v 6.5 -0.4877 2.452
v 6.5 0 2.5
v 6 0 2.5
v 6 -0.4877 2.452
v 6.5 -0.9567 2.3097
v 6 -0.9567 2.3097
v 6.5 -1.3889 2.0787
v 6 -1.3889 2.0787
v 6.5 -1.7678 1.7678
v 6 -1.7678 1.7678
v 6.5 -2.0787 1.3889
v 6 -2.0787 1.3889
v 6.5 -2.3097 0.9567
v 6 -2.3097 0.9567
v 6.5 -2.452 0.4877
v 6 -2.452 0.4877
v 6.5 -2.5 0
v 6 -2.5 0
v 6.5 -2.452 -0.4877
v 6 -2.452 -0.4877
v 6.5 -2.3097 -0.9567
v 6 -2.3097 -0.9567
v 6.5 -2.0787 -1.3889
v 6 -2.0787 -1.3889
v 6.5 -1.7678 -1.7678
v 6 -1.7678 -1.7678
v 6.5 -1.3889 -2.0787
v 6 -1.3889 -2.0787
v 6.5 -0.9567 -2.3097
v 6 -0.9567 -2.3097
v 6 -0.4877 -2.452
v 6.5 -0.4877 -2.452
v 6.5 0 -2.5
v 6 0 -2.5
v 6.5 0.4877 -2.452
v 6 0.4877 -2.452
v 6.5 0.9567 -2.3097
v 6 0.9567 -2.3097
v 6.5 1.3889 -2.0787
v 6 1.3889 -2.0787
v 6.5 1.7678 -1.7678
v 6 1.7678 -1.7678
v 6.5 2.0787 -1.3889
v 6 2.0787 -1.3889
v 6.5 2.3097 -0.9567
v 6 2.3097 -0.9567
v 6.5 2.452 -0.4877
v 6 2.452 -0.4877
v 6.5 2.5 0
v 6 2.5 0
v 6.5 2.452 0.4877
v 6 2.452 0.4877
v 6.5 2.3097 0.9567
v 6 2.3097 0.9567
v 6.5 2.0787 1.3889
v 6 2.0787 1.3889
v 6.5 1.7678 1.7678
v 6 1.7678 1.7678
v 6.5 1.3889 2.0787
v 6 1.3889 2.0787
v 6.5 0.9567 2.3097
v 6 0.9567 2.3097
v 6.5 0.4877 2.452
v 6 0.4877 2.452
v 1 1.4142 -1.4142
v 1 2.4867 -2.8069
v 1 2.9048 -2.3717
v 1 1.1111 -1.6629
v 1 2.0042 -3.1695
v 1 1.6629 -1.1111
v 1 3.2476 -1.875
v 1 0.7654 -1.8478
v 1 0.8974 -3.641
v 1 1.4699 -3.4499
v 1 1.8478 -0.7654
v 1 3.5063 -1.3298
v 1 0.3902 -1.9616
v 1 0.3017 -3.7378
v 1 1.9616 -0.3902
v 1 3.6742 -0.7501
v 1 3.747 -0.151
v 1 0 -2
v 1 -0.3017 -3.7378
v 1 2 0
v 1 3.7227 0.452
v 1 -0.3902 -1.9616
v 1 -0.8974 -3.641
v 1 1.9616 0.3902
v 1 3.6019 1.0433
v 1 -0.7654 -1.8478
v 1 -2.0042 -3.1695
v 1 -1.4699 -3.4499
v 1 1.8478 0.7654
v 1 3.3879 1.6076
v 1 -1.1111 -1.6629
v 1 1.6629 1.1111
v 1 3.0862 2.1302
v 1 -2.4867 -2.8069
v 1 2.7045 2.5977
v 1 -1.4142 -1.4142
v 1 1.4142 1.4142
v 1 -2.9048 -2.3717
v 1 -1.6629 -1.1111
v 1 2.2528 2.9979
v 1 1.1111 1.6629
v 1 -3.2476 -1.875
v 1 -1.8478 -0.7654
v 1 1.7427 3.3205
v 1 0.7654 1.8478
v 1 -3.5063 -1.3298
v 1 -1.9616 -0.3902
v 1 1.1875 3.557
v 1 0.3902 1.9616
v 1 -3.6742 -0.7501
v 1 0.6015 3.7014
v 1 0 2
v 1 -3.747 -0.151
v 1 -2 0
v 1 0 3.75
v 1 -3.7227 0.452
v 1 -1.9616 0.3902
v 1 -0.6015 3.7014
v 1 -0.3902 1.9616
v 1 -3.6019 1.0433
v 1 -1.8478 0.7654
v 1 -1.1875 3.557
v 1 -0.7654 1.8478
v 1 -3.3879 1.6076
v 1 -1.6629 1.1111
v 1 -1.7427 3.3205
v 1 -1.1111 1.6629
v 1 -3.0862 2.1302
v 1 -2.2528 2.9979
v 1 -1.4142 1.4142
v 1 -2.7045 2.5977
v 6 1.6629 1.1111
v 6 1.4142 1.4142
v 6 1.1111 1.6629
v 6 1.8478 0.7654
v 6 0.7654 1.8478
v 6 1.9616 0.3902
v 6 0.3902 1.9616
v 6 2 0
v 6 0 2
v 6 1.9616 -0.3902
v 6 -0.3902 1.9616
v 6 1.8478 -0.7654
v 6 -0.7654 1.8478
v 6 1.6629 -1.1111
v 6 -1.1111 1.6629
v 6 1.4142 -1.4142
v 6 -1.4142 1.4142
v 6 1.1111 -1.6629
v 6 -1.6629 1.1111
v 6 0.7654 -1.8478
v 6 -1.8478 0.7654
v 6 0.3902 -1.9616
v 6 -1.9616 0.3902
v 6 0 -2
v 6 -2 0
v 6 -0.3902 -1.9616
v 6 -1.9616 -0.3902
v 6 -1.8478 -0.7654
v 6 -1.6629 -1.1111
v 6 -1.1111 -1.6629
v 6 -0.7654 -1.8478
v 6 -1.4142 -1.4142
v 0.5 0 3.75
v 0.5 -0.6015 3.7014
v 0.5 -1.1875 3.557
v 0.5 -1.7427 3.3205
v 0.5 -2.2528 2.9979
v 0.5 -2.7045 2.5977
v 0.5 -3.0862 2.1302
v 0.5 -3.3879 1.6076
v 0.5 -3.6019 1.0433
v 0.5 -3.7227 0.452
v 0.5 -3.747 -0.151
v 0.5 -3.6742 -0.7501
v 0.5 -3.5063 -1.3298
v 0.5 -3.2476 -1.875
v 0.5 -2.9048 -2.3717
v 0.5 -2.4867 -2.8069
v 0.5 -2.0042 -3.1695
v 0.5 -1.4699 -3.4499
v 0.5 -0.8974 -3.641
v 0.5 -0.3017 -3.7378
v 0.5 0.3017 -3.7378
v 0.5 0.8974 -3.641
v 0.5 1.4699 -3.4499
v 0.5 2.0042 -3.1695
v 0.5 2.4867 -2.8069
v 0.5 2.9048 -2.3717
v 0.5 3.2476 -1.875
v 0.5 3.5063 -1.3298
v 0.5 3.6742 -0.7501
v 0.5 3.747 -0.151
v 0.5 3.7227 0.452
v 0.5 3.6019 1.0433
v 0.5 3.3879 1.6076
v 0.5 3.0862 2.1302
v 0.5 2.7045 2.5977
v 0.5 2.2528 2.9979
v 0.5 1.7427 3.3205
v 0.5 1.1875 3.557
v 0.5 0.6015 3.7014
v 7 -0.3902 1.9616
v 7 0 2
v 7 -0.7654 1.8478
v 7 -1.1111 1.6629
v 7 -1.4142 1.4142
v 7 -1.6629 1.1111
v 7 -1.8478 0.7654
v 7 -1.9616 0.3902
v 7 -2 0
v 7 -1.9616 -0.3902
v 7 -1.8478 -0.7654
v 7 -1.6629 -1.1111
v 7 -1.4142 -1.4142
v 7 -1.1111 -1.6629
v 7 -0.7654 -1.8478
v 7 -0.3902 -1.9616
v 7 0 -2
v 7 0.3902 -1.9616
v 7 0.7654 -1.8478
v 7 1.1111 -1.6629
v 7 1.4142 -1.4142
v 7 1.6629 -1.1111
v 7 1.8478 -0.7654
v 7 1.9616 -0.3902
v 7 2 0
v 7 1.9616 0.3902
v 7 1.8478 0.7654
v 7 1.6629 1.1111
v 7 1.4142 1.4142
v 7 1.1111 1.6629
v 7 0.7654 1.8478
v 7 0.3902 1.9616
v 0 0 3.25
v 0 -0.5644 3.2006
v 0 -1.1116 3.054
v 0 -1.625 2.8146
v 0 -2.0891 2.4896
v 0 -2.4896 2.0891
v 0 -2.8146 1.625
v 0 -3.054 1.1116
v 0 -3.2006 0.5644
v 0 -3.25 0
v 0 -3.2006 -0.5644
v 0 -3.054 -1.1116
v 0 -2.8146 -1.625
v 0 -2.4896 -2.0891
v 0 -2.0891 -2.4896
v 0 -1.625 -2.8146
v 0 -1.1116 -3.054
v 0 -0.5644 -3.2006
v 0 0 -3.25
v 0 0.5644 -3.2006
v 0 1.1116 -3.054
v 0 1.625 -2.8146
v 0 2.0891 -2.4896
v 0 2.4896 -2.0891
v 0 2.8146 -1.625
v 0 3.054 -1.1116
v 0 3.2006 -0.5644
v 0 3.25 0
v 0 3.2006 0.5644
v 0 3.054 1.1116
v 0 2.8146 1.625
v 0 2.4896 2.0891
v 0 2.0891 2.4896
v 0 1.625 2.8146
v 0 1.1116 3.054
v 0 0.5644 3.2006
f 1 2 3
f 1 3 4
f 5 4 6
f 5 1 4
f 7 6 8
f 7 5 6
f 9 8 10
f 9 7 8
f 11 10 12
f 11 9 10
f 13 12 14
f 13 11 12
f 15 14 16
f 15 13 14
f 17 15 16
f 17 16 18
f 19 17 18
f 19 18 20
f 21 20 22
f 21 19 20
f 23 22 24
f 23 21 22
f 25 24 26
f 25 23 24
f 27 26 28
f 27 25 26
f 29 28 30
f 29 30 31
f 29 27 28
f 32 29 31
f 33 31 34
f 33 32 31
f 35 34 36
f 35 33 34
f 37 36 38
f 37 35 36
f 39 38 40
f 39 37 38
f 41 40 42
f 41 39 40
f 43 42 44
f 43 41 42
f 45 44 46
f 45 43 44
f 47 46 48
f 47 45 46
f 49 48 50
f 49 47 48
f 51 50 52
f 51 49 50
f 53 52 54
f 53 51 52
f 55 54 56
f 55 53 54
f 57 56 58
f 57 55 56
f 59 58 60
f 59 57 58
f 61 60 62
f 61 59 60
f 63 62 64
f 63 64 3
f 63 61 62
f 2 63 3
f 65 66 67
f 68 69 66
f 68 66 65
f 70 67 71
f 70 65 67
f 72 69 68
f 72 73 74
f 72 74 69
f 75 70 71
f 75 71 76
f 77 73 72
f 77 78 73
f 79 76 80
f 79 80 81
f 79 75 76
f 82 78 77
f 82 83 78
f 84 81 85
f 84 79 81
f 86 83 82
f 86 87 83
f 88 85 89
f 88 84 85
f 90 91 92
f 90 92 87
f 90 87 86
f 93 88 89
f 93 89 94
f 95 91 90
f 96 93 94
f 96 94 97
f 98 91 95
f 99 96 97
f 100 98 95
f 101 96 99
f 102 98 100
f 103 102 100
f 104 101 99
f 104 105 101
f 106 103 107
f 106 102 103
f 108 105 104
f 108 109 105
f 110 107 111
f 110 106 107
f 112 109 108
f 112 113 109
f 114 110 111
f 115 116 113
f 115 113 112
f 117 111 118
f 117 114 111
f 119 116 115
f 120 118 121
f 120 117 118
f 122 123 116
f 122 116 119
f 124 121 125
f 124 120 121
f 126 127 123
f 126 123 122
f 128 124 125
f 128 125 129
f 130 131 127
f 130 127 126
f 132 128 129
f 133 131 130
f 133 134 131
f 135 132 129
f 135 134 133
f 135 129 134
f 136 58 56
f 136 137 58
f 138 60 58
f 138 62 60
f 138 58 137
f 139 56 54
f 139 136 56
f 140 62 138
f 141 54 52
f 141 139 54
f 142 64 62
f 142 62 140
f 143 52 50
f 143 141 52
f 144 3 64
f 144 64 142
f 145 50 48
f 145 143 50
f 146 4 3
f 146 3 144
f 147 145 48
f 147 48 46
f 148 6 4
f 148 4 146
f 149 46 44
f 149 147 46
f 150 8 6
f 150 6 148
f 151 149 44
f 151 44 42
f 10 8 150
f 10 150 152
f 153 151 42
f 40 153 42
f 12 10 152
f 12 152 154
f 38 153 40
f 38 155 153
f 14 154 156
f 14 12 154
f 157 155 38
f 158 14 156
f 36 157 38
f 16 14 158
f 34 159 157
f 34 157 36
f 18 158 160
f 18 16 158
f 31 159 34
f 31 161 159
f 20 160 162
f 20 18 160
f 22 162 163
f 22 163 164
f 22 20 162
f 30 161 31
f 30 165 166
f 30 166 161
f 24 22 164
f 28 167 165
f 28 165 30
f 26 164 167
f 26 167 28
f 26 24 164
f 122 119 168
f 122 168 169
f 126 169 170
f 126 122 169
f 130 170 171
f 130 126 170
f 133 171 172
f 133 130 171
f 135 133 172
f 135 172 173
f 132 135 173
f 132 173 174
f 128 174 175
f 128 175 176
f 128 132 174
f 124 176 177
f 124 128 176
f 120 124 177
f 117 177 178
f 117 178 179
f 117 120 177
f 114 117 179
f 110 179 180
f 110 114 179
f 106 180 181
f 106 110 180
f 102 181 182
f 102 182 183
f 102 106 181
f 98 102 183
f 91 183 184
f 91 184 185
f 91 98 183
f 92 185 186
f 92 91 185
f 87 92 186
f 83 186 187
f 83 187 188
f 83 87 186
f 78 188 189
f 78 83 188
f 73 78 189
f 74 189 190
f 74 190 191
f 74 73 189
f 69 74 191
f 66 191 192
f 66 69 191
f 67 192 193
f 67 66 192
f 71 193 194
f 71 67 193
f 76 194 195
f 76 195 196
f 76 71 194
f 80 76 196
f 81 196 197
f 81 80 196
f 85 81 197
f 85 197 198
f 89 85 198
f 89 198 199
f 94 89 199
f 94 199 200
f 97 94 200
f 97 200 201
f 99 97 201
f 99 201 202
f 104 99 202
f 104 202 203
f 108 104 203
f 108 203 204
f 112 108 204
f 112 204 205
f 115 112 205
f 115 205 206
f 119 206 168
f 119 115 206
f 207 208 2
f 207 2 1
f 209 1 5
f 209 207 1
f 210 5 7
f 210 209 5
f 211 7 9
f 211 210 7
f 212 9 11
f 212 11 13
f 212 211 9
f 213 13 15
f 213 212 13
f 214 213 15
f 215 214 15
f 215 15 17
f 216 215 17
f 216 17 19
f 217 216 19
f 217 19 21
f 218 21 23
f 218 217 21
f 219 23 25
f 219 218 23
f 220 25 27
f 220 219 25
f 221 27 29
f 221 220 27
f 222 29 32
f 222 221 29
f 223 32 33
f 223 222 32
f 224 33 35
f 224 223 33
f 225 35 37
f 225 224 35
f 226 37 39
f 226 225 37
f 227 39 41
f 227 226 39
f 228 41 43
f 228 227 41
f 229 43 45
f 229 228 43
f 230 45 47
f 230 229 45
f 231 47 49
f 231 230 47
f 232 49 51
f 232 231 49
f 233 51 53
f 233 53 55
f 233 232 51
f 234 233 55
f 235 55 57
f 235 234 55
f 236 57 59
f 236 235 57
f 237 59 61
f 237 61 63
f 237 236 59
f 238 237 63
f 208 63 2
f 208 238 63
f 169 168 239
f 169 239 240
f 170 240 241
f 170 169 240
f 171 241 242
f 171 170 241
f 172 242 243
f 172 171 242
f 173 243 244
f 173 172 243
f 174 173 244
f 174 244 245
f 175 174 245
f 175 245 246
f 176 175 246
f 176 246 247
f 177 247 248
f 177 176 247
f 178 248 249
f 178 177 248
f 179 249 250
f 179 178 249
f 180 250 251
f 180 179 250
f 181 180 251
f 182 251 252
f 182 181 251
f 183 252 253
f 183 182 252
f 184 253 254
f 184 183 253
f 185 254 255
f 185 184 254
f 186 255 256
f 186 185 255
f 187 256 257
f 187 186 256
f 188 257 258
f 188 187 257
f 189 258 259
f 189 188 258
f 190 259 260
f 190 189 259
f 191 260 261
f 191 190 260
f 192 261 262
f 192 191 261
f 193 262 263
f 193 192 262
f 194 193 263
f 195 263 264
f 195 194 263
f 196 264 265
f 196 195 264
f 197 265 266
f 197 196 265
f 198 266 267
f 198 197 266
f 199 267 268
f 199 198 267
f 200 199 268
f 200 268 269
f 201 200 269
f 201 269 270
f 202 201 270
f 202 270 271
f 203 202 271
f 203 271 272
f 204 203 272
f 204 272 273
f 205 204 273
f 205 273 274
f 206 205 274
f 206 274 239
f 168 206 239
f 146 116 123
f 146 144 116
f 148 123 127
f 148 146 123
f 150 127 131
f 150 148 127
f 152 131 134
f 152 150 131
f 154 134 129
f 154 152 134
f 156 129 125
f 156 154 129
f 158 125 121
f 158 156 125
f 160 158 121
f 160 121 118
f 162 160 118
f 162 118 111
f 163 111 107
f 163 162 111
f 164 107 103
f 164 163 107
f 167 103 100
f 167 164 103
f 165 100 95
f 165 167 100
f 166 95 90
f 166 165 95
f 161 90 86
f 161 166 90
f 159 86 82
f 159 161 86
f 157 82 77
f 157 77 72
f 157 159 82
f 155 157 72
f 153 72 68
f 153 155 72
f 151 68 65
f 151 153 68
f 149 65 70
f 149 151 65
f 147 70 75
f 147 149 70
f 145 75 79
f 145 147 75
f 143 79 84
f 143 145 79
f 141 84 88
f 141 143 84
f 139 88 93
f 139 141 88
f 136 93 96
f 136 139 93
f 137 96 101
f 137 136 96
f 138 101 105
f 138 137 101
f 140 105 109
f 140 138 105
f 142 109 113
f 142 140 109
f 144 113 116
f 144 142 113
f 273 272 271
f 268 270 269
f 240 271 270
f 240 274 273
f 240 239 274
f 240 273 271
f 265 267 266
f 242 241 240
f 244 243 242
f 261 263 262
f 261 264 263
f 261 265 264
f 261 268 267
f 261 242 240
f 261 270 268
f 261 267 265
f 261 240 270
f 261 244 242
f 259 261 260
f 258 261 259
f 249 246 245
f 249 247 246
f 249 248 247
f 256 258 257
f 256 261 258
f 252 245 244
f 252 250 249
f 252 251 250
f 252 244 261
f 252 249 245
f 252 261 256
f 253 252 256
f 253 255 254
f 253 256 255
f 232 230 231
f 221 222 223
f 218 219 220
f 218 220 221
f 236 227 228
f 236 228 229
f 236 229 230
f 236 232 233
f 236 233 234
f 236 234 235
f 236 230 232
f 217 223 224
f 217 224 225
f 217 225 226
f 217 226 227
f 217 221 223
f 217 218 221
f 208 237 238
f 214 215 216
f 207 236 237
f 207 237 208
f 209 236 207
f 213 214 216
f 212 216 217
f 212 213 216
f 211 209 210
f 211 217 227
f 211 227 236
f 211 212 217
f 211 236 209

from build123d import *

# Parameters (mm, degrees)
SMUSSO1_SIZE = 0.5


with BuildPart() as part:
    # Schizzo1 → Rivoluzione1 (revolve)
    with BuildSketch(Plane.XY, mode=Mode.PRIVATE) as rivoluzione1_sk:
        Polygon((0, 0), (0, 3.75), (1, 3.75), (1, 2), (6, 2), (6, 2.5), (7, 2.5), (7, 0), align=None)
    revolve(rivoluzione1_sk.sketch.rotate(Axis((-5.173483989, 0, 0), (1, 0, 0)), 90), axis=Axis((-5.173483989, 0, 0), (1, 0, 0)))

    # Smusso1
    smusso1_edges = [part.edges().sort_by_distance(p)[0] for p in [
        (7, 0, -2.5),
        (0, 0, -3.75),
    ]]
    chamfer(smusso1_edges, length=SMUSSO1_SIZE)


solid = part.part
